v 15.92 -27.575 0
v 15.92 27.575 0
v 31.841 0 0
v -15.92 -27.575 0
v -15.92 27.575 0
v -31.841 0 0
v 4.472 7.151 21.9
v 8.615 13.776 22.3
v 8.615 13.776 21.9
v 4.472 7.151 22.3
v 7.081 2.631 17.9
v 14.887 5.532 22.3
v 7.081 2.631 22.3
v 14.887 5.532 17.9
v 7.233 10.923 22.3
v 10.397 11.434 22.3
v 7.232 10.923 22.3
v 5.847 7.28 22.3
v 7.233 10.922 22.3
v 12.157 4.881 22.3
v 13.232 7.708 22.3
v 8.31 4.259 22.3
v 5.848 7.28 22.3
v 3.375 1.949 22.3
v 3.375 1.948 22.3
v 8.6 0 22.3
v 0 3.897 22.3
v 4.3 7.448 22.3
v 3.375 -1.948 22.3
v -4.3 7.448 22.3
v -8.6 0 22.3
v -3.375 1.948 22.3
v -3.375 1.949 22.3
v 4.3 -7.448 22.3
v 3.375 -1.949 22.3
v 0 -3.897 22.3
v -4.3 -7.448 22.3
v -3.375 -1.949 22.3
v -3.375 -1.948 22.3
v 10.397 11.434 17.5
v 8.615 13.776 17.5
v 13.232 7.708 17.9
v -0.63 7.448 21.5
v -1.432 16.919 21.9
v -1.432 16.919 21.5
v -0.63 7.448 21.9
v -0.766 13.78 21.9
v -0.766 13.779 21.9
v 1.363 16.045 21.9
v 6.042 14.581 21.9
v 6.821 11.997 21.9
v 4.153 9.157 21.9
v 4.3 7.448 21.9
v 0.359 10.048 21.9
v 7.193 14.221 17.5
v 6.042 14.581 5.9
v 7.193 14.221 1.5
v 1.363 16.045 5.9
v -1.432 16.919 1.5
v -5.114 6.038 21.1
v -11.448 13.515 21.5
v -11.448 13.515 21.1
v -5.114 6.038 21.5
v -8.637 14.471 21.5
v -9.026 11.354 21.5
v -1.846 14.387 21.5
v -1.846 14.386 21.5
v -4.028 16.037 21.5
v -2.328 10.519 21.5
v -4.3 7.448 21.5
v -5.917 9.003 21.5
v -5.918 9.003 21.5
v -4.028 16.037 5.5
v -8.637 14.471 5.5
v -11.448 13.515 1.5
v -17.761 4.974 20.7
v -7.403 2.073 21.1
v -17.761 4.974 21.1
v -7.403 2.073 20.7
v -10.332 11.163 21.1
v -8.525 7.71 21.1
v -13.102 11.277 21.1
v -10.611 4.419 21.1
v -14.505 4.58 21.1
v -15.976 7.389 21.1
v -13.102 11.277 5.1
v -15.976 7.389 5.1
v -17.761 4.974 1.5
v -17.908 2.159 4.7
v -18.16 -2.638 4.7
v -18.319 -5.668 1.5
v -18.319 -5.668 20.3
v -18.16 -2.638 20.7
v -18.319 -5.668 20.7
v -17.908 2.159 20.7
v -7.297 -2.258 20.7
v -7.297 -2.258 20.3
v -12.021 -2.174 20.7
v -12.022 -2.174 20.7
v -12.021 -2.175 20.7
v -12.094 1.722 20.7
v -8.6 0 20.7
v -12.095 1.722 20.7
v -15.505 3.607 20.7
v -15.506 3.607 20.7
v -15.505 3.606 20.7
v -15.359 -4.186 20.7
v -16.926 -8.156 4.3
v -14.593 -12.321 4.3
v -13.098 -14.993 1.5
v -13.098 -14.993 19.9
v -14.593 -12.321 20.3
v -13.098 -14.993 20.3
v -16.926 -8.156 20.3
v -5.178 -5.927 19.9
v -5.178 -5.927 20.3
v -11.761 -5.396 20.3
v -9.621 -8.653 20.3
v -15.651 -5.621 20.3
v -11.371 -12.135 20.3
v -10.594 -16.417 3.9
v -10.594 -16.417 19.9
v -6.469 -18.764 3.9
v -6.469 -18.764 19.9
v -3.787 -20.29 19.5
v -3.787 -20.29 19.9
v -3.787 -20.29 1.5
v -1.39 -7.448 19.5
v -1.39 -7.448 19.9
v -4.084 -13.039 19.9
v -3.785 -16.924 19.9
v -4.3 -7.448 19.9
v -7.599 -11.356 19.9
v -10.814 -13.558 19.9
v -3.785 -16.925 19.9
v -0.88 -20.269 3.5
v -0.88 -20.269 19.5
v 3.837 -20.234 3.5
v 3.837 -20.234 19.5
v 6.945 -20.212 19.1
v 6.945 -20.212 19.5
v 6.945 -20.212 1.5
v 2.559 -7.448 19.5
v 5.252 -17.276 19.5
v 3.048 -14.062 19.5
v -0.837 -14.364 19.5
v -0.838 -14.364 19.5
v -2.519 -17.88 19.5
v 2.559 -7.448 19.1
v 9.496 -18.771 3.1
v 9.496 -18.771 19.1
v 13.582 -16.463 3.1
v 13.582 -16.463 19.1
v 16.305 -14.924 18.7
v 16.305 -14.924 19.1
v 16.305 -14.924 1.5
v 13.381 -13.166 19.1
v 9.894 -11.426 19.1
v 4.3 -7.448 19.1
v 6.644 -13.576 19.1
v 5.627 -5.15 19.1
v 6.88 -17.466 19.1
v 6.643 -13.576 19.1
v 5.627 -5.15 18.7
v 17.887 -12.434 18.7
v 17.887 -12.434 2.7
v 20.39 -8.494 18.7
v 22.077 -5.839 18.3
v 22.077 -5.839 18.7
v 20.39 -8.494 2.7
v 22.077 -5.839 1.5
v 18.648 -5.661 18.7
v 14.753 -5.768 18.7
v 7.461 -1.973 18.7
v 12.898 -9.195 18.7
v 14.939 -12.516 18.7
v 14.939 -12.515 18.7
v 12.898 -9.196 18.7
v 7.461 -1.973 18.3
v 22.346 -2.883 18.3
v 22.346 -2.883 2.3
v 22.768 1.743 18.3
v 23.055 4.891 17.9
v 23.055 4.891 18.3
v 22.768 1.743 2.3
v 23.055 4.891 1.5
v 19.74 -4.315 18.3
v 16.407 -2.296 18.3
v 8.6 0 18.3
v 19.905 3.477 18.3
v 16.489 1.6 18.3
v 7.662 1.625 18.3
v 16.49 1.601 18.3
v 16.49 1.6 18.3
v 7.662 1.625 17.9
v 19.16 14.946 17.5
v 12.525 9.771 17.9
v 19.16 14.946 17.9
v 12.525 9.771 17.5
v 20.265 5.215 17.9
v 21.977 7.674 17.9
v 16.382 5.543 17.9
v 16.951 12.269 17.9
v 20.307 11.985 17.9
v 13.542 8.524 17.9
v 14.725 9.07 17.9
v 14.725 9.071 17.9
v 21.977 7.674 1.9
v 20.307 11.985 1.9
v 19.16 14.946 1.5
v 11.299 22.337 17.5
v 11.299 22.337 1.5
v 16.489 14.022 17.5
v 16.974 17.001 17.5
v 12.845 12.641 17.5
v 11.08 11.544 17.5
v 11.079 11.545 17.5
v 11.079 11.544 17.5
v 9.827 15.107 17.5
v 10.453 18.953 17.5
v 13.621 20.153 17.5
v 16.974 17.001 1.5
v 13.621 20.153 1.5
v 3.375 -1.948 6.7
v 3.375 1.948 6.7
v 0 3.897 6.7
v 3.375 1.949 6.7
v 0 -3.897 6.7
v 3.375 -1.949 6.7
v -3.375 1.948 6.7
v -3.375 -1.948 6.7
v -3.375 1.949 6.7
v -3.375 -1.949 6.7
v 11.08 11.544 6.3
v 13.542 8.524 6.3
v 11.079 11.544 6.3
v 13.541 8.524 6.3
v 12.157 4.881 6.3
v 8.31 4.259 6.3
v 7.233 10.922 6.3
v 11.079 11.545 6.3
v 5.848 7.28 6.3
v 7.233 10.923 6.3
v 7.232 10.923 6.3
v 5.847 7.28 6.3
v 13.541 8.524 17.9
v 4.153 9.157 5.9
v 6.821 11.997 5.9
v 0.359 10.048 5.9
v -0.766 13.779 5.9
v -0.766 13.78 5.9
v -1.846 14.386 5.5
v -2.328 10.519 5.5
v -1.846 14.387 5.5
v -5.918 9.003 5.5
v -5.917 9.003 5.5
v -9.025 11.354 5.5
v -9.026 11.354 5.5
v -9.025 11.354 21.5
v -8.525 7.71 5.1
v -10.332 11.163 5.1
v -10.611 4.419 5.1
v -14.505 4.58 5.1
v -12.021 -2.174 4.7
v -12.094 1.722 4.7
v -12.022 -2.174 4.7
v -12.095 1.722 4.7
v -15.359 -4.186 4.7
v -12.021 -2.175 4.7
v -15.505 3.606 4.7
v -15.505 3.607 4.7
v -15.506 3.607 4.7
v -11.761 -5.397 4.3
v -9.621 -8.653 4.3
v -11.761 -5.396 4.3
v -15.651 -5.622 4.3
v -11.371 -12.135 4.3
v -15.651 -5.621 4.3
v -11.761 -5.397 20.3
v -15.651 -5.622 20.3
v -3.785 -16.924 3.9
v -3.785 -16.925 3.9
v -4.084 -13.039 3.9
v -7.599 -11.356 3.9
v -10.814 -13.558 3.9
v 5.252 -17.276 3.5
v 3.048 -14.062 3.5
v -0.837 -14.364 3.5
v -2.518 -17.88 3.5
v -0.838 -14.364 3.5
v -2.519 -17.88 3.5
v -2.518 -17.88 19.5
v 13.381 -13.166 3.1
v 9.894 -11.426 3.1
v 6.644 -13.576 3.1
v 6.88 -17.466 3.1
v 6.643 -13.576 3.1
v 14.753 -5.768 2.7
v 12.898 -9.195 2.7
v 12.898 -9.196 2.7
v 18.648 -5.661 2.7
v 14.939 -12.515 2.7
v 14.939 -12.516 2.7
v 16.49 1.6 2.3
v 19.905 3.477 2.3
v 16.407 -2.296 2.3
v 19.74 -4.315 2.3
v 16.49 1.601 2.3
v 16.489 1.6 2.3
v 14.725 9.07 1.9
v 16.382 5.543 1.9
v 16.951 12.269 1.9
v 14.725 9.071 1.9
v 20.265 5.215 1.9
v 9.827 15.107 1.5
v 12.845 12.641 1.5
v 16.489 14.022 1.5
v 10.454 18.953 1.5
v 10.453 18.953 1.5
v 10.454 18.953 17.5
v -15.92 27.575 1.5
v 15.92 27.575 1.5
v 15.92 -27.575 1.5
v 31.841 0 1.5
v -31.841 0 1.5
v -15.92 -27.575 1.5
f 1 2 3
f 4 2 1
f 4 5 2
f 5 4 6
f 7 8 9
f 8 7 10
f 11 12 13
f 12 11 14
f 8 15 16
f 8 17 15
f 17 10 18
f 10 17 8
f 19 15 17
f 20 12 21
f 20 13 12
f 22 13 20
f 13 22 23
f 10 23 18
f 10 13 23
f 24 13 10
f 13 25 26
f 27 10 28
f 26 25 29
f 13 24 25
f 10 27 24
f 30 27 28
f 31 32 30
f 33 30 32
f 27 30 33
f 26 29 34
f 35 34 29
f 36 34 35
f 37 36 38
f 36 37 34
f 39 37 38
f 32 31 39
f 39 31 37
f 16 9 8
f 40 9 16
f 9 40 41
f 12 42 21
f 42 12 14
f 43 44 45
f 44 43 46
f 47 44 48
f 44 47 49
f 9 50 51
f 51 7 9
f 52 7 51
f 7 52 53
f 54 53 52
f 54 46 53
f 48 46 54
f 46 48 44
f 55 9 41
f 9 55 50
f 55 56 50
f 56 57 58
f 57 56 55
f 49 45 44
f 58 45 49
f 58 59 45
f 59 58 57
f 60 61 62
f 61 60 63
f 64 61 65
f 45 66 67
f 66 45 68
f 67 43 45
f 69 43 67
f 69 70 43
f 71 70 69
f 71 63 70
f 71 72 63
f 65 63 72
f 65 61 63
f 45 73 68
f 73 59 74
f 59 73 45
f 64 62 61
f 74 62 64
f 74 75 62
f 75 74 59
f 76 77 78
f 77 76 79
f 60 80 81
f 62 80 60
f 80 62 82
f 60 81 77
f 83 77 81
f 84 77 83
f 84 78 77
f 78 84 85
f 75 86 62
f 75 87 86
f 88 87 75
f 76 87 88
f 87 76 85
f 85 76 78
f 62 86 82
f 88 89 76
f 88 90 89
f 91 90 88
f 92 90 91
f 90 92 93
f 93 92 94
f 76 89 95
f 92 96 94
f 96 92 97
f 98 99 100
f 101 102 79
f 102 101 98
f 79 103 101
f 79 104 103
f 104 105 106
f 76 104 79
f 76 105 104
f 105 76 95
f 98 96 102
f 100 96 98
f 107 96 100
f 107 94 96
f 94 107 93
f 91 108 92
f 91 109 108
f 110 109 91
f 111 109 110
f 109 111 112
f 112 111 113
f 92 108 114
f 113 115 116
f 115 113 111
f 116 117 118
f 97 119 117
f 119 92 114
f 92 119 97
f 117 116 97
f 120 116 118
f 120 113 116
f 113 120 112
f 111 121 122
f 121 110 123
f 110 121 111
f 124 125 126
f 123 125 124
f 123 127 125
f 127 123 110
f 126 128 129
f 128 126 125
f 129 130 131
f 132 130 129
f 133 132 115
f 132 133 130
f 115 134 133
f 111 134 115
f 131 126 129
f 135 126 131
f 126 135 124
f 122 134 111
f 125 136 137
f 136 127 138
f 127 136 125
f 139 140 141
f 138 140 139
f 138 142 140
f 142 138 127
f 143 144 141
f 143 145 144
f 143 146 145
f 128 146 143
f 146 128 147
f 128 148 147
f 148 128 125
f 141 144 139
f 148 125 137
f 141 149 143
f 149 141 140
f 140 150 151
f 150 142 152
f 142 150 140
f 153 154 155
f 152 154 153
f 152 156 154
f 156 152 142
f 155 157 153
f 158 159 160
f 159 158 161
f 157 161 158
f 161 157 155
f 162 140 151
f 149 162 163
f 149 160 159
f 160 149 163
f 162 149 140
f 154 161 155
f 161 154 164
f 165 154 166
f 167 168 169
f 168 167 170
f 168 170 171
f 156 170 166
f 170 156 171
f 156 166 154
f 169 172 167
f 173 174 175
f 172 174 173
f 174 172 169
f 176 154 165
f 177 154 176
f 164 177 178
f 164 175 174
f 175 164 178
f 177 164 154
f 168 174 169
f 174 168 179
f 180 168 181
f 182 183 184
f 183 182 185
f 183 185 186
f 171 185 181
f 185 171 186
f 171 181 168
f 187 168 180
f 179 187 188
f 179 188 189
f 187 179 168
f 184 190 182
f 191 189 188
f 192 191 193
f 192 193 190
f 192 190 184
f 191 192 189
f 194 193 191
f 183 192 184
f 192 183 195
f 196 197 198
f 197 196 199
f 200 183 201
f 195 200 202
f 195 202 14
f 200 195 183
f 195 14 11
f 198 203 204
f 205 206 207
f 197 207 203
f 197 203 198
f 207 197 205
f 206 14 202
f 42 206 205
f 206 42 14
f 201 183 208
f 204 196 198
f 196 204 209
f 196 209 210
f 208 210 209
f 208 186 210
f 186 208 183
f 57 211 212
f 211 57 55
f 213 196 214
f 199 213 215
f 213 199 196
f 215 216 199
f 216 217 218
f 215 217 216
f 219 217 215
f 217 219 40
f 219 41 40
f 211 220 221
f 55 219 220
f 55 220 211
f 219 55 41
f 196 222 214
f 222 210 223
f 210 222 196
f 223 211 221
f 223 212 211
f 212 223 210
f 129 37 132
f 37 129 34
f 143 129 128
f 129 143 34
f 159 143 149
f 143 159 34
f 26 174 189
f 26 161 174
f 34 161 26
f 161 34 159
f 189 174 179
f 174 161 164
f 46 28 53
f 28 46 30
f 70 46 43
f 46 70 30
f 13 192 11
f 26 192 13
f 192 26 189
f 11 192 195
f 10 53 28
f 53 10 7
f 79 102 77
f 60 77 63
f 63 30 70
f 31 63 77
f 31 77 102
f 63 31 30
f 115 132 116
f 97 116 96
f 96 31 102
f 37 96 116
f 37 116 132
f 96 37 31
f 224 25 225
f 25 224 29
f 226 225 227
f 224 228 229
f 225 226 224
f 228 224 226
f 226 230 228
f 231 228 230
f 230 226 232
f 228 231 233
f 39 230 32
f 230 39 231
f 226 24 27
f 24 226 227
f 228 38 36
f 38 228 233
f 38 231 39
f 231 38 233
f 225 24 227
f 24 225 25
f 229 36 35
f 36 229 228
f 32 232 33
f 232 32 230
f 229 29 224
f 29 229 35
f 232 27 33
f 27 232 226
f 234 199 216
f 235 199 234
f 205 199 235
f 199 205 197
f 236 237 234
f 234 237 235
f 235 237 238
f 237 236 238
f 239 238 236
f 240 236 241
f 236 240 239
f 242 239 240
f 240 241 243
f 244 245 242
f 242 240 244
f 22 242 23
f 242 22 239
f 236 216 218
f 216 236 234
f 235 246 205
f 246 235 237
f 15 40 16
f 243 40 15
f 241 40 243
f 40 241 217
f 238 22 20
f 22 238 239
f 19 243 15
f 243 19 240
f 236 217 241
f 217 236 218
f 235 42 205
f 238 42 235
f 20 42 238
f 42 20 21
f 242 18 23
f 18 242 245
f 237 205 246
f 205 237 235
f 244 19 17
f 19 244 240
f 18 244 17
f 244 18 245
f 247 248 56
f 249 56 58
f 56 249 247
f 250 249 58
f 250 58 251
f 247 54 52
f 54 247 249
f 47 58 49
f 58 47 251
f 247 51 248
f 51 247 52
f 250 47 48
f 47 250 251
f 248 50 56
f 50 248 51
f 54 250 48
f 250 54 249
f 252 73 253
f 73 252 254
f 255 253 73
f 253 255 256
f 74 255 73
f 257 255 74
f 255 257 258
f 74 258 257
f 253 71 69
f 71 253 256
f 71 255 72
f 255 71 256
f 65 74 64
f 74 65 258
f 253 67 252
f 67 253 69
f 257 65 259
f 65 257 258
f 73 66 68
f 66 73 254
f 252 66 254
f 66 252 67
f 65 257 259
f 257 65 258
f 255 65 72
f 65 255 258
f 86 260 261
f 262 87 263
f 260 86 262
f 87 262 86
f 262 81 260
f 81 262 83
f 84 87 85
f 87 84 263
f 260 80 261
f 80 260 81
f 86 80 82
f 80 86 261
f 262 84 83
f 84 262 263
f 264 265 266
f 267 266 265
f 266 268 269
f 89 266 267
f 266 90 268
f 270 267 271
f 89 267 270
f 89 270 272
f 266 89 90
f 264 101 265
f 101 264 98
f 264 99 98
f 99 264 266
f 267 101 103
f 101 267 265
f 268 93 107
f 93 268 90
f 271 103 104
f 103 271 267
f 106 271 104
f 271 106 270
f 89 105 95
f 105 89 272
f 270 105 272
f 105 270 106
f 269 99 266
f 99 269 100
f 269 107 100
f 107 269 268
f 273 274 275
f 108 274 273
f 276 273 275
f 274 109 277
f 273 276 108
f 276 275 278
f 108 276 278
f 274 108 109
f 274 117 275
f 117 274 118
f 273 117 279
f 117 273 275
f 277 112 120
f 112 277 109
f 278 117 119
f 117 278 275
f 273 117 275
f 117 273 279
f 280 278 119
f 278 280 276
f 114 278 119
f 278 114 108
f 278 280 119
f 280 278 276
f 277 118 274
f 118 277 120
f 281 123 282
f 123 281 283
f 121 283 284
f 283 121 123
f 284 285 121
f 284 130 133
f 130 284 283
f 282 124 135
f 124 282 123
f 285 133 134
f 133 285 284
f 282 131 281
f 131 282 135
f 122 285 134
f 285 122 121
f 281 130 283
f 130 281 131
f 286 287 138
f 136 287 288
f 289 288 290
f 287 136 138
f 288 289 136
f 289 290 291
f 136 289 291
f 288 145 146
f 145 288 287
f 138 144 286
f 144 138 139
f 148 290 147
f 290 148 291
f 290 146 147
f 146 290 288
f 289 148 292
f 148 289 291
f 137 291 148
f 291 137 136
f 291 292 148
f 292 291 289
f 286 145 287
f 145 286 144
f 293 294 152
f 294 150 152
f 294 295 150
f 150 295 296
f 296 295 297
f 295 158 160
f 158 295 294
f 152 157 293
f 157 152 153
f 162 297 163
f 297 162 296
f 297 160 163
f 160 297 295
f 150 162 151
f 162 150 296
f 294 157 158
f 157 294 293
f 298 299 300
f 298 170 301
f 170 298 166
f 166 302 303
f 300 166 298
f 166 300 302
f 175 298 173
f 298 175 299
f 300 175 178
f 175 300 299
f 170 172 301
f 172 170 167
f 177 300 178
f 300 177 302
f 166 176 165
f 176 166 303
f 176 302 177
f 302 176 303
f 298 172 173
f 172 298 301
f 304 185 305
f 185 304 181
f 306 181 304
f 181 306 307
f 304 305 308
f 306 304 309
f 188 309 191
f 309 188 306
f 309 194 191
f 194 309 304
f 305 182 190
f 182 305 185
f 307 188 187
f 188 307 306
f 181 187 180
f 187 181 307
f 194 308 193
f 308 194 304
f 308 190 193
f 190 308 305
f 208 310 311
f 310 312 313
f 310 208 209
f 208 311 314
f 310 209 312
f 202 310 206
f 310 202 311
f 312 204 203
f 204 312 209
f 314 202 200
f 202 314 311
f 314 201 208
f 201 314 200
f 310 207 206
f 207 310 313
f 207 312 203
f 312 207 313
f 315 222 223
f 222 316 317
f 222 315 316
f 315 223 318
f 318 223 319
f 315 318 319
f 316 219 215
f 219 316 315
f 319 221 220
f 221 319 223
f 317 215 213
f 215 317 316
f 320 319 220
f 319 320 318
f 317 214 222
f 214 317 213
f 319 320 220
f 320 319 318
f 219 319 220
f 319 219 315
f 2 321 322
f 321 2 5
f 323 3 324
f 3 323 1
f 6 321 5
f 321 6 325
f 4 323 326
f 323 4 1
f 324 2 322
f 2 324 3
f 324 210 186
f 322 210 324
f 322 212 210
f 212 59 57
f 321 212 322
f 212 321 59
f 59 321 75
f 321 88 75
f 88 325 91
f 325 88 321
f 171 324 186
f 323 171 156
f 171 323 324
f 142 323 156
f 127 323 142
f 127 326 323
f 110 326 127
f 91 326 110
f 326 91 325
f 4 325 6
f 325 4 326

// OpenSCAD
/**
 * Remix of hex bit holder by Fitzterra
 * https://www.thingiverse.com/thing:1686330
 *
 * This remix evolved until it is now almost completely, but not entirely, unlike the original, and
 * has the following features:
 *  - Stepped spiral layout of bits
 *  - Cutouts showing bit size are an artefact of the spiral drawing technique, and go all the way down to the bottom of the bit.
 *  - Hex or round holes
 *  - Extended base for stability
 *  - Just for fun, the base and centre platform are hexagonal
 *
 * To do (but probably won't ever get done. Remix it!)):
 *  - Make the outer surface a smooth curve, (and a circular base to match)
 *  - Make the top surface smooth instead of a staircase
 *  - Allow users to optionally add outer sides to the holes
 *  - Parameterize base size
 *  - Fillet corners
 *
 * Author: FrankV <drifter.frank@gmail.com>  - Dec 2018
 **/

// Number of bits, not including centre
numBits =13;
// Height of the footer
foot = 1.5;
// Height of side above bottom of bit
height = 16;
// Shape of hole
holeShape = "hex"; // ["hex", "round"]

/* [ Advanced ] */
// Clearance to allow for printer errors, etc.
clearance = 0.2;
// Gap between hole edges from one round of the spiral to the next
radialGap = 1.9;
// Gap between hole edges for adjacent bits (adjust so that gaps between outer bits align with inner bits)
circumGap = 1.2;
// Hex size (1/4" + clearance) or hole diameter
hexSize = 25.4/4 + 2*clearance;
// inner diameter = diameter of step drill
innerDiam = 13;
// Footer step (adjust so that bottom of cutout is above outer step)
footStep = 0.4;


// Calculate location of each bit in polar coordinates.
// numBits+2 points
// Bit 0 is the centre, which is not counted in numBits
// numBits+1 is needed to calculate the outside edge of the last step in the spiral
// 12.5 is a fudge factor, sin(60)
// Radius to centre of each each bit
rad = [0, for (b = [1: numBits+1]) innerDiam/2+radialGap+hexSize/2+ b * (hexSize+circumGap*2)/12.5];
// Angle between two adjacent bits to give constant distance between bits... decreases with increasing radius
delta = [0, for (b = [1: numBits+1]) atan2(hexSize/sin(60)+circumGap*2, rad[b])];
// Angle to each bit ... (rad, angle) = Polar coordinates of bit position
angle = [0, for (b = [1: numBits+1]) sum(b, delta)];

// Calculate points around the spiral at the outside of each bit. These points are used to build the 
// staircase spiral. These points are midway between this bit and the next bit, and at the outside edge of the bit.
// A step is made up of a triangle from the centre to these midpoints
spiral = [  
    // The first bit is at (rad[1], angle[1]), so add the preceding "midway" point
    [cos(angle[1]+(angle[1]-angle[2])/2)*(rad[1]+hexSize/2), sin(angle[1]+(angle[1]-angle[2])/2)*(rad[1]+hexSize/2)],
    for (b = [1: numBits])
        // Generate a point midway between this bit and the succeeding bit
            [cos((angle[b]+angle[b+1])/2)*((rad[b]+rad[b+1])/2+hexSize/2), sin((angle[b]+angle[b+1])/2)*((rad[b]+rad[b+1])/2+hexSize/2)]
  ];
    
bitHolder();
linear_extrude(foot) circle(r=rad[numBits]+hexSize+radialGap*2, $fn=6);
   
module bitHolder() {
    difference() {
        union() {
            // Spiral staircase
            for (i = [1: numBits]) {
                baseHeight = foot+(numBits-i) * footStep;
                // One step which surrounds the hex cutout, and has edges coincident with adjacent steps
                linear_extrude(baseHeight + height) polygon([spiral[i-1], spiral[i], [0,0]]);
            }
            // Central platform is at the same height as first bit
            cylinder(d = innerDiam+radialGap*2+clearance*2, h = foot+(numBits-1) * footStep + height, $fn=6);
        }
        
        // Central hole
        translate([0, 0, foot+numBits * footStep + (height+0.1)/2])
            hole();
        for (i = [1: numBits]) {
            baseHeight = foot+(numBits-i) * footStep;
            rotate(angle[i]) {
                translate([rad[i], 0, baseHeight +(height+0.1)/2]) 
                    hole();
            }
       }
    }
}
            

// The hole cutout... 
module hole() {
    if (holeShape == "hex") {
        // It is important that a flat of the hex will be parallel to the YZ plane. Using $fn=6 doesn't work
        for (i =[0:60:120]) {
             // 0.5773 measured in OnShape.com as the right ratio of diameter to flat size
            rotate(i)  cube([hexSize, hexSize*0.5773, height+0.1], center=true);
        }
    } else {
        cylinder(d = hexSize, h = height+0.1, center = true);
    }
}

 // add all array elements 0 to n (recursive)
 function sum(n, array) = ( n==0 ? 0 : array[n] + sum(n-1, array) );
